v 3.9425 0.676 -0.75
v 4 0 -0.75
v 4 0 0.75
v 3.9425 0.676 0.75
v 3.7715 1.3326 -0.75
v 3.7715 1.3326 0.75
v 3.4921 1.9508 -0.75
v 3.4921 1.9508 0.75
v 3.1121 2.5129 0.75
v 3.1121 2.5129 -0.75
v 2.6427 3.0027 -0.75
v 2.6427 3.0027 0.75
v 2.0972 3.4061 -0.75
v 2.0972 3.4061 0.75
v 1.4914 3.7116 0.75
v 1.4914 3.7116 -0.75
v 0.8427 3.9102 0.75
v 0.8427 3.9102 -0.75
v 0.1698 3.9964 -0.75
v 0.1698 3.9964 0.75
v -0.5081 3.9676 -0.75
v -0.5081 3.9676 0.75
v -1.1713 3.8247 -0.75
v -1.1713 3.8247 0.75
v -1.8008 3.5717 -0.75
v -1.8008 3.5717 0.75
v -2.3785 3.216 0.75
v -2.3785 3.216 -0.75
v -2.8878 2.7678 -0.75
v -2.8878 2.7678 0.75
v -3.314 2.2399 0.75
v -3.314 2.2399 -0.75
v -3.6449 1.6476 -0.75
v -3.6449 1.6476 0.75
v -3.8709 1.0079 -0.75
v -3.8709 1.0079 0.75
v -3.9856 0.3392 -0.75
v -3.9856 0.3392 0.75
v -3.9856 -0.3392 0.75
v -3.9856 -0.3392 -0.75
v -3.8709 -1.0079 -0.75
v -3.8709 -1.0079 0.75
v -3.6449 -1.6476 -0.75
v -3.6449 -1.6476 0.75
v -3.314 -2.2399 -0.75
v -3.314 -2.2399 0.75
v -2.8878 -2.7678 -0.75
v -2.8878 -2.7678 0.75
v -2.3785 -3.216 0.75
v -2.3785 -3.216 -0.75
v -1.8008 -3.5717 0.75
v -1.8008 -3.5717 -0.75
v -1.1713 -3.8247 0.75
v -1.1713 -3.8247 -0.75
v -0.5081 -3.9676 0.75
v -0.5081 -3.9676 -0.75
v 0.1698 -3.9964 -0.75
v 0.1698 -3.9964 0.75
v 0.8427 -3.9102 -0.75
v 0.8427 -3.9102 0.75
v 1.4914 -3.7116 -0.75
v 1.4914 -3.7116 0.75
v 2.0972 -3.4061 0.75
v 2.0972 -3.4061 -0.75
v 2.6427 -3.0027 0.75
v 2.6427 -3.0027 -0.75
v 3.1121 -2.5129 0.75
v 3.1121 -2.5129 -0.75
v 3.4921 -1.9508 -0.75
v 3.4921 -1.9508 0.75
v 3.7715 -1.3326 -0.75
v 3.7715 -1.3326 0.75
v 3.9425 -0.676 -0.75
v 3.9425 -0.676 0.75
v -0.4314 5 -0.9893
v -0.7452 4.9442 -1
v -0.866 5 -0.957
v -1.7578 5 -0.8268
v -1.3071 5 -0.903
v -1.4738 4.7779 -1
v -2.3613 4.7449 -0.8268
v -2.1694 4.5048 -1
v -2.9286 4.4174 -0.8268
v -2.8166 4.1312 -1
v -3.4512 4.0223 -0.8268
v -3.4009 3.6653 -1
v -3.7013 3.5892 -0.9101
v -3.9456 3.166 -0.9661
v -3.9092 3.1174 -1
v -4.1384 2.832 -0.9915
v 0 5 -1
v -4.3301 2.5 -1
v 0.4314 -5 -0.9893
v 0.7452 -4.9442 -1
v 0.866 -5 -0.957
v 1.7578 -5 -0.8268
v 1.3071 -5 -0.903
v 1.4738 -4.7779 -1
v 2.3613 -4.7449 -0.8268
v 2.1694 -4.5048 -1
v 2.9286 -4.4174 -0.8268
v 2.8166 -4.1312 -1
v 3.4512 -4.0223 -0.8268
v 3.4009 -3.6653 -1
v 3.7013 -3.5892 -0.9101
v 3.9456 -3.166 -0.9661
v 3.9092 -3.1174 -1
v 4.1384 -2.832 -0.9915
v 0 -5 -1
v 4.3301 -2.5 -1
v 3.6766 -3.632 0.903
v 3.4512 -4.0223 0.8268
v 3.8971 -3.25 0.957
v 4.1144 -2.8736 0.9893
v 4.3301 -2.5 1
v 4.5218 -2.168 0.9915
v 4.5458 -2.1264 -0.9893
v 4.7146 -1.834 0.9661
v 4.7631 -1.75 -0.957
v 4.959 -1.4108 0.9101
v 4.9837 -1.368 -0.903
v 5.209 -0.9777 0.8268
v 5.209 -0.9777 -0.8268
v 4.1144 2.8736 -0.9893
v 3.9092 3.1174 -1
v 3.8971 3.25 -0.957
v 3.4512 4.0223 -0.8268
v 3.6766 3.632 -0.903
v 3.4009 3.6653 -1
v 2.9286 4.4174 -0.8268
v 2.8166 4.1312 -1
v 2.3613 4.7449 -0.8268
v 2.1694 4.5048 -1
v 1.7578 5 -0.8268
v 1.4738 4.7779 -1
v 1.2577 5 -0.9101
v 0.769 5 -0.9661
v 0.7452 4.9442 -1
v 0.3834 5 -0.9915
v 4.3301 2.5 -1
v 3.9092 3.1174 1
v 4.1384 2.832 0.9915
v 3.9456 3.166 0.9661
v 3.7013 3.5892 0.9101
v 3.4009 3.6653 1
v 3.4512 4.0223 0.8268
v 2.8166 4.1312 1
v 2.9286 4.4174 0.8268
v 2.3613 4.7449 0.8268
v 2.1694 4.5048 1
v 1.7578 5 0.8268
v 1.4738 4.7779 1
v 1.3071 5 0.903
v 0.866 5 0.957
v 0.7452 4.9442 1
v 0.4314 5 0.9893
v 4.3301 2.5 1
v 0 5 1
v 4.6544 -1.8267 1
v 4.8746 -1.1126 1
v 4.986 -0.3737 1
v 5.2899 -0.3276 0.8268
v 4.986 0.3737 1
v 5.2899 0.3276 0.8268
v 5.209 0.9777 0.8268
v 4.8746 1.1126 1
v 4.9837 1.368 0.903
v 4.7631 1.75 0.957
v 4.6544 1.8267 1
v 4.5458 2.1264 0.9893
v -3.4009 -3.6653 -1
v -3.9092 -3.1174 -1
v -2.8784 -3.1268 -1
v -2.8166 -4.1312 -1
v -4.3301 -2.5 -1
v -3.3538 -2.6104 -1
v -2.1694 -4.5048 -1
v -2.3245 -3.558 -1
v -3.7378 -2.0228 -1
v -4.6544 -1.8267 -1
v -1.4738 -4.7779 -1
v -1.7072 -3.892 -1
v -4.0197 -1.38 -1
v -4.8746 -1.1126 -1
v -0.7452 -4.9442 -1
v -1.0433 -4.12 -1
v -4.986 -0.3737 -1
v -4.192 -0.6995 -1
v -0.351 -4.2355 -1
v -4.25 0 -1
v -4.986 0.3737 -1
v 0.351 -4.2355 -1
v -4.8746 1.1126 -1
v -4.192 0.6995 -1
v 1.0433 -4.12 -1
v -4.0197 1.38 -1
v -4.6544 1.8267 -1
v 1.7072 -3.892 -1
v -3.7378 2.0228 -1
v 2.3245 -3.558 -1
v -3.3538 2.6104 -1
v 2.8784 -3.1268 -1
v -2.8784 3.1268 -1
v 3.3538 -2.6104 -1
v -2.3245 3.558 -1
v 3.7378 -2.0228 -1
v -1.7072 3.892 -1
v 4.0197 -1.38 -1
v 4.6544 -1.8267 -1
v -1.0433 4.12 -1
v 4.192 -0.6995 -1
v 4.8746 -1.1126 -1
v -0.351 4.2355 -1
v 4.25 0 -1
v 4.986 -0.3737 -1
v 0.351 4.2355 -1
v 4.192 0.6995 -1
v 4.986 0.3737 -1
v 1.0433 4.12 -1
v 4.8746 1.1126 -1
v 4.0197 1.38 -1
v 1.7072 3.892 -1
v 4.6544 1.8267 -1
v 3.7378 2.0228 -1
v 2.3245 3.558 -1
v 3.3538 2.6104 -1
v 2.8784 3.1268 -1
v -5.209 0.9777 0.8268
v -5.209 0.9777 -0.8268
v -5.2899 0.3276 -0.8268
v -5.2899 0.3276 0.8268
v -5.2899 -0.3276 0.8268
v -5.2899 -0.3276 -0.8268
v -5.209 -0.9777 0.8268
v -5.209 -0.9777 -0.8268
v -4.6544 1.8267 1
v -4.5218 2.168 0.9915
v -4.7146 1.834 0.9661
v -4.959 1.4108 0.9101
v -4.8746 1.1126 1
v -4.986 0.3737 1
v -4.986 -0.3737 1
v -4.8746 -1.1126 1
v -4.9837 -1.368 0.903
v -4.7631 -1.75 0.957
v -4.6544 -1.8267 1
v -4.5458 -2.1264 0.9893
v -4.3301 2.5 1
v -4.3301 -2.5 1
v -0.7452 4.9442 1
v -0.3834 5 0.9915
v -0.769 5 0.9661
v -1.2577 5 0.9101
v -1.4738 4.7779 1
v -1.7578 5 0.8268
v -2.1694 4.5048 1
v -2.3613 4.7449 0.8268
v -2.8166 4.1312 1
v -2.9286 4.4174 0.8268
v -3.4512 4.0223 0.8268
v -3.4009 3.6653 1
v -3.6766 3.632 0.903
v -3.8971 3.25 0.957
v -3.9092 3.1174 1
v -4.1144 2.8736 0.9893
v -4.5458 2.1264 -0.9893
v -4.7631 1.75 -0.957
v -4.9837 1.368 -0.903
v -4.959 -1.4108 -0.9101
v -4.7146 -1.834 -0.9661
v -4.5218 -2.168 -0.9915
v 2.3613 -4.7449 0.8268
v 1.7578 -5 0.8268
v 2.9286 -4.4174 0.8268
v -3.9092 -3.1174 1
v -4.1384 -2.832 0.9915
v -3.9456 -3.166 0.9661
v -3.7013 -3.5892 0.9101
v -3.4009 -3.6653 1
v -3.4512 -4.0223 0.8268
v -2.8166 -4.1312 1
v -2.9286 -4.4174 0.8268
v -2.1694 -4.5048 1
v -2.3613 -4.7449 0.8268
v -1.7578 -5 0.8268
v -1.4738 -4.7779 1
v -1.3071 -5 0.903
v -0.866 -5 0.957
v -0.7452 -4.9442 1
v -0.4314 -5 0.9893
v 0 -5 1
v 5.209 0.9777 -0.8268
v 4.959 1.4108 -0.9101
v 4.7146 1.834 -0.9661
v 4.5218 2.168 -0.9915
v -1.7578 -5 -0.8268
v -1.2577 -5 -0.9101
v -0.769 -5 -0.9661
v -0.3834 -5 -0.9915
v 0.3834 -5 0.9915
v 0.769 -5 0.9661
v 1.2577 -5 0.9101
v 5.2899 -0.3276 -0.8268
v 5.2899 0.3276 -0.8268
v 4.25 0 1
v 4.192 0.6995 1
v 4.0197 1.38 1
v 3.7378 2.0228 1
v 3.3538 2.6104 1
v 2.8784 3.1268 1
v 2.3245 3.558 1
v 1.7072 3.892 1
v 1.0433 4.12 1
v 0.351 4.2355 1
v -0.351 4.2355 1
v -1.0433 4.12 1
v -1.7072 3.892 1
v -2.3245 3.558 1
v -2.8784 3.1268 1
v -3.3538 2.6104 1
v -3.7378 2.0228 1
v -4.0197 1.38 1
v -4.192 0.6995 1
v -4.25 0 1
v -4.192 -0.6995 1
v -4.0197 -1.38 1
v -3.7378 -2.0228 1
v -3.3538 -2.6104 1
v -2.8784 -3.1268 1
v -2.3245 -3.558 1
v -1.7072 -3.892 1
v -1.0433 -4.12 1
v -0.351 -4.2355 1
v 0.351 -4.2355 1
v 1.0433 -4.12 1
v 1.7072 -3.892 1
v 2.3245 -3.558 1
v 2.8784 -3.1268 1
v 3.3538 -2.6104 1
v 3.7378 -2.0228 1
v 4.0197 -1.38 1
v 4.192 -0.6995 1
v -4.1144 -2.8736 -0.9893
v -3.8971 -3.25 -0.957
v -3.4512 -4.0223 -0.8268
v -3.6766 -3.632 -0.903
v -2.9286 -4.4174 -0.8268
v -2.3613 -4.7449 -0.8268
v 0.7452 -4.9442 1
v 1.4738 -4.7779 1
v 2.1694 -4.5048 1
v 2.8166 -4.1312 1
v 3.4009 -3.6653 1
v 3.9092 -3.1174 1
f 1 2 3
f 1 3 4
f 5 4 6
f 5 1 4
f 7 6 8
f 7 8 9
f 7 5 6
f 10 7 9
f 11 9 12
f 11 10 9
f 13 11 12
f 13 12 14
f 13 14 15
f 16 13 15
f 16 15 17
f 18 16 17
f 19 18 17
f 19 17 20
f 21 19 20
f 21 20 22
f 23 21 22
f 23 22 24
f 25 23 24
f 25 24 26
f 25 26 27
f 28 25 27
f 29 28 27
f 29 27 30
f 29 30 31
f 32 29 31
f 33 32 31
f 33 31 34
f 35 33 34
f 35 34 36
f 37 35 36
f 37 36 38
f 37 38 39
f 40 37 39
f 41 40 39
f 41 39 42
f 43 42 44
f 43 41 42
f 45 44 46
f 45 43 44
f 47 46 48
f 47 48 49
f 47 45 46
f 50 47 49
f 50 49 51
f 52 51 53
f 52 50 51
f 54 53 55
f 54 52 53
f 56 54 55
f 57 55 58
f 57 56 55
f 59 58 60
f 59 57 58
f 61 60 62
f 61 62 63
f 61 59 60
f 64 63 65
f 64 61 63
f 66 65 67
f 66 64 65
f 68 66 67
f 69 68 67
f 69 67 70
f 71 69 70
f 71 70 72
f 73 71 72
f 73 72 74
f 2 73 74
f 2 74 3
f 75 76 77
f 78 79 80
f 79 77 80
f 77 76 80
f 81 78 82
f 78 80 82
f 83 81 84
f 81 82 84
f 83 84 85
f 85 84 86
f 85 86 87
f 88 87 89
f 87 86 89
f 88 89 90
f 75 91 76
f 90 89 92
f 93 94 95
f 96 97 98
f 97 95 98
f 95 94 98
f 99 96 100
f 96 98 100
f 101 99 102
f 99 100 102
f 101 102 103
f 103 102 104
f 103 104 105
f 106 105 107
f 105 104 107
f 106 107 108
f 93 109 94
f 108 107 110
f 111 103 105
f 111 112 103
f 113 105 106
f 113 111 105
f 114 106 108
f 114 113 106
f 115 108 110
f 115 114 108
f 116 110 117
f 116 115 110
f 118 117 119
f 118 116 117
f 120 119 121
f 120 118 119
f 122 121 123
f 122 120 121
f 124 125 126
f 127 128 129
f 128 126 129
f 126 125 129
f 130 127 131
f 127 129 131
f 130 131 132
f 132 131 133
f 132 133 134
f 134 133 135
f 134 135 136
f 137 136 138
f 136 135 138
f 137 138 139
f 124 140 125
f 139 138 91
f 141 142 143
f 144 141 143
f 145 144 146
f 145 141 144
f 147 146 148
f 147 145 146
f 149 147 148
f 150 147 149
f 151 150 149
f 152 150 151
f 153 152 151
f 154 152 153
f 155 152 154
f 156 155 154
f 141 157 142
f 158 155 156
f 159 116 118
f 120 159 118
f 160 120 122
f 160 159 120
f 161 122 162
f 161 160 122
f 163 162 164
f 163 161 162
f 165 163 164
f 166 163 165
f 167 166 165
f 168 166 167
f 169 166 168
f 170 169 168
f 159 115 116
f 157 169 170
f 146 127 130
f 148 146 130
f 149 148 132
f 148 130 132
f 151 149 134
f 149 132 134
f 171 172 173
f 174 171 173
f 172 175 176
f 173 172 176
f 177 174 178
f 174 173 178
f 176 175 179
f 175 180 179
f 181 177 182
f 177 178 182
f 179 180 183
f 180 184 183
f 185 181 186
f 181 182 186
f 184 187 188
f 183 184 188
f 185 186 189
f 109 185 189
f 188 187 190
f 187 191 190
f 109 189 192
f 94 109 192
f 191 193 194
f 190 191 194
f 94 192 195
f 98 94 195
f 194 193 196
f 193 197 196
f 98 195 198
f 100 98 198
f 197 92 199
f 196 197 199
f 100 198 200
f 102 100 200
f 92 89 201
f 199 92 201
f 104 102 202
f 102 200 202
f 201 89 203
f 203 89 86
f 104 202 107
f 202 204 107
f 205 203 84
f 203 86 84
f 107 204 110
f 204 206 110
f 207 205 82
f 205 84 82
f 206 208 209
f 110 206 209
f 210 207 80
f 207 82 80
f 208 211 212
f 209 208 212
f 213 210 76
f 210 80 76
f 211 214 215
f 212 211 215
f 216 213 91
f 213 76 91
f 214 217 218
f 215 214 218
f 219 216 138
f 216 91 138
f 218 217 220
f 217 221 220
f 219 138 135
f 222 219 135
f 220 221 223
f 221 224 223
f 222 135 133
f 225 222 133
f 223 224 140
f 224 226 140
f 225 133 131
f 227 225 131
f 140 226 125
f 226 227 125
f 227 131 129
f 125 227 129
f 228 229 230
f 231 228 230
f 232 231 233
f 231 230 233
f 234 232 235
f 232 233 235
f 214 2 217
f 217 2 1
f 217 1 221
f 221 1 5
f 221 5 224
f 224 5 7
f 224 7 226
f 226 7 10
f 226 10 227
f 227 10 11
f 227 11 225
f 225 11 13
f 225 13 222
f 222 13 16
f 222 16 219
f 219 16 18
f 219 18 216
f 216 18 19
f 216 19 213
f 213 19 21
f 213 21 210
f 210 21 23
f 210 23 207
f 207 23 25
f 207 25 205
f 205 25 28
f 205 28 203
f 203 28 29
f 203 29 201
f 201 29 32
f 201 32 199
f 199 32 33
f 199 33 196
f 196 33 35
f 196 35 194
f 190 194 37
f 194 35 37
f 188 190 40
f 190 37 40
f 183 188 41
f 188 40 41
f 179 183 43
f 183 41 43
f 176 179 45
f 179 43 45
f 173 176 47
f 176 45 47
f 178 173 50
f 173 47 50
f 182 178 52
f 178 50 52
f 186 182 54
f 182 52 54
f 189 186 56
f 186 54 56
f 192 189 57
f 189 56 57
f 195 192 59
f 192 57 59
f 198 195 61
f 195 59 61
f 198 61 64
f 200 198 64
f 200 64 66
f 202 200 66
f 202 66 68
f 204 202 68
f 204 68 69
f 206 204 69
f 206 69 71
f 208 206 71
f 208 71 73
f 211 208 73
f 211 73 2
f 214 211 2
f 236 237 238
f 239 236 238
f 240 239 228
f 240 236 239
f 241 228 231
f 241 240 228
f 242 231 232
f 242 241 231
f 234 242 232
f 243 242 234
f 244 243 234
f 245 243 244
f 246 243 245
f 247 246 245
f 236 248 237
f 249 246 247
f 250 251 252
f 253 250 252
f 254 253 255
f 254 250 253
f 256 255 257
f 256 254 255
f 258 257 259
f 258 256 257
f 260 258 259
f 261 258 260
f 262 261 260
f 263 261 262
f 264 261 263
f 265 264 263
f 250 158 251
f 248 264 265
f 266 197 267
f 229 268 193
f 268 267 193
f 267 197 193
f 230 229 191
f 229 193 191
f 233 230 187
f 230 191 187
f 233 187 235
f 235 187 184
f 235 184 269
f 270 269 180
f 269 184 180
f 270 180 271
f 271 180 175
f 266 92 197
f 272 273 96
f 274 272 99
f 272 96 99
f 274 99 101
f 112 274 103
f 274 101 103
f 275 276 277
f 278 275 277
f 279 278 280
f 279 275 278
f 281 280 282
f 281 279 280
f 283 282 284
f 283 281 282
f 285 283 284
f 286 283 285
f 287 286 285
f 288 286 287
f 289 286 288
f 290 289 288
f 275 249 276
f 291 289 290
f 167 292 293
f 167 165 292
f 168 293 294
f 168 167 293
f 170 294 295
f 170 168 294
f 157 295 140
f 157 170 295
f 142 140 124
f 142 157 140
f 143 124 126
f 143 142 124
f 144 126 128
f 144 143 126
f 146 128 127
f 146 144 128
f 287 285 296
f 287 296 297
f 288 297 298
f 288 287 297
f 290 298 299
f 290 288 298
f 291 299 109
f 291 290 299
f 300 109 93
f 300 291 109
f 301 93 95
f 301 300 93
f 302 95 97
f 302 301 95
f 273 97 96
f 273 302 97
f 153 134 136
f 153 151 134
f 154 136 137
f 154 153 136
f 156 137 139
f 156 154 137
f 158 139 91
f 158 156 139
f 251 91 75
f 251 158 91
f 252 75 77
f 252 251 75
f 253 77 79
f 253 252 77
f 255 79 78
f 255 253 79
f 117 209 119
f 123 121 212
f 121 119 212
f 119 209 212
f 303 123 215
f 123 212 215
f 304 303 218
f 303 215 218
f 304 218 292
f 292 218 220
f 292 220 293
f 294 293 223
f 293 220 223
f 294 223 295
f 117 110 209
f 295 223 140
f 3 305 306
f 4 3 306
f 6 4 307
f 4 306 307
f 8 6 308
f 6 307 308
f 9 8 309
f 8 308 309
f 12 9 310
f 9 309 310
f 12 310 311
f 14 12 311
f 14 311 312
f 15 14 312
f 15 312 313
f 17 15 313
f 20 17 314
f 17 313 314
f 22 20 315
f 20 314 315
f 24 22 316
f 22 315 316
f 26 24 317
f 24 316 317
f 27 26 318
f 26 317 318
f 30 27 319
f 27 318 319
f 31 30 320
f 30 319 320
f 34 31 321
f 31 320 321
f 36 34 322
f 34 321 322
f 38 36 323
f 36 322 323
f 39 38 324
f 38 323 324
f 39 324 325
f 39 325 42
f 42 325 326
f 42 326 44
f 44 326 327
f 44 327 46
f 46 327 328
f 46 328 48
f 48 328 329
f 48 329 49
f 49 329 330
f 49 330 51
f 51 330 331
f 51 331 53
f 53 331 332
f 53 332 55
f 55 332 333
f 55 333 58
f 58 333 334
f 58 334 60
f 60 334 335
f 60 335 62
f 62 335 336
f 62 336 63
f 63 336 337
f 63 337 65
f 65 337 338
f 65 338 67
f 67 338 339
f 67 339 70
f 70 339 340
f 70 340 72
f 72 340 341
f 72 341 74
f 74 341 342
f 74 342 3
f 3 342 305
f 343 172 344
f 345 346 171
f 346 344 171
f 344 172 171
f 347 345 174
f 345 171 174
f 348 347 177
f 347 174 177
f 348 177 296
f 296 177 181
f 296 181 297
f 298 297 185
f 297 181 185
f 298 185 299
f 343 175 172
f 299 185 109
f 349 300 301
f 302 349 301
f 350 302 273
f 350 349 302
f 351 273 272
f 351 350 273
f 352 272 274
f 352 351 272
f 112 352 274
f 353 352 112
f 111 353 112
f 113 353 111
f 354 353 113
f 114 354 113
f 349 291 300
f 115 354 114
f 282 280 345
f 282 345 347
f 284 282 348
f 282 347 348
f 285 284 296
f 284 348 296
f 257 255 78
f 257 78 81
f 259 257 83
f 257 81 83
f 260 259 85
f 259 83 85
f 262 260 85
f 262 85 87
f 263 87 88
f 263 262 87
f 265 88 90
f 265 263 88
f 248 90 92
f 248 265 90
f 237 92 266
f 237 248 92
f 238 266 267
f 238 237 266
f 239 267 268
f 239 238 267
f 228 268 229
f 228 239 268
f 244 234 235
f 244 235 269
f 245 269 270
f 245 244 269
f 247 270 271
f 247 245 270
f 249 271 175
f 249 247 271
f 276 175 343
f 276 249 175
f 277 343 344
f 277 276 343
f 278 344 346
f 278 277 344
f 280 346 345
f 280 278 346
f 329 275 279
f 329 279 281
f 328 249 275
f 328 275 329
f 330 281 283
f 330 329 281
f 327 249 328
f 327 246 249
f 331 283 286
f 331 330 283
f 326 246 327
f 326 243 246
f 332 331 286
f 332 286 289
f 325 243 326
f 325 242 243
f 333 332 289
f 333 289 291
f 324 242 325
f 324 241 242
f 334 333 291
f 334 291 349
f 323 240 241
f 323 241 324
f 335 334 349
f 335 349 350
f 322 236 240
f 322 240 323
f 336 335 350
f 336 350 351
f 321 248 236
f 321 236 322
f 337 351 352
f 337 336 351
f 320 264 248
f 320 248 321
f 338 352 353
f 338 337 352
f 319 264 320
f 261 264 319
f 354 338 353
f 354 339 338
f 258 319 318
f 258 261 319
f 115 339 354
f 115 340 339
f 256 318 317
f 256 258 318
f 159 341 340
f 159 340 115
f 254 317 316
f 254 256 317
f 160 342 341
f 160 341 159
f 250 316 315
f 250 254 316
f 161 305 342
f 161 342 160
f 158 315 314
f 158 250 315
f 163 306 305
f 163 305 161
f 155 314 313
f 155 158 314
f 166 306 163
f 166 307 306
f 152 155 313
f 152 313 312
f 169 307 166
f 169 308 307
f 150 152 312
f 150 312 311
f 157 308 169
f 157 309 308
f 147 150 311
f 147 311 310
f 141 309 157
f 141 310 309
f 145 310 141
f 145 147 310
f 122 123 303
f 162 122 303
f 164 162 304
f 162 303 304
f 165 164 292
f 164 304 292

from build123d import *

# Parameters (mm, degrees)
HEX_SKETCH_R               = 4
HEX_2_DEPTH                = 1
HEX_CHAM_ID_SIZE           = 0.25
HEX_ROUND_DEPTH            = 8.702813339
HEX_ROUND_DEPTH_BACK       = 8.702813339
HEX_ROUND_SKETCH_OUTSIDE_W = 16.63
HEX_ROUND_SKETCH_OUTSIDE_H = 15.082
HEX_ROUND_SKETCH_OUTSIDE_R = 5.3


with BuildPart() as part:
    # Hex_Sketch → Hex 2 (new, symmetric)
    with BuildSketch(Plane.XY):
        Polygon((2.886751346, 5), (-2.886751346, 5), (-5.773502692, 0), (-2.886751346, -5), (2.886751346, -5), (5.773502692, 0), align=None)
        Circle(HEX_SKETCH_R, mode=Mode.SUBTRACT)
    extrude(amount=HEX_2_DEPTH, both=True)

    # Hex Cham OD_Sketch → Hex Cham OD (revolve, cut)
    with BuildSketch(Plane(origin=(0, 0, 0), x_dir=(1, 0, 0), z_dir=(0, 1, 0))):
        Polygon((-5.773502692, 1), (-5.773502692, 0.553418013), (-5, 1), align=None)
        Polygon((-5, -1), (-5.773502692, -1), (-5.773502692, -0.553418013), align=None)
    revolve(axis=Axis((0, 0, -5.304715554), (0, 0, 1)), mode=Mode.SUBTRACT)

    # Hex Cham ID
    hex_cham_id_edges = [part.edges().sort_by_distance(p)[0] for p in [
        (-4, 0, -1),
        (-4, 0, 1),
    ]]
    chamfer(hex_cham_id_edges, length=HEX_CHAM_ID_SIZE)

    # Hex Round_Sketch outside → Hex Round (cut, two sides: drawn at the far end of the back side and taken through both)
    with BuildSketch(Plane.XY.offset(-HEX_ROUND_DEPTH_BACK)):
        Rectangle(HEX_ROUND_SKETCH_OUTSIDE_W, HEX_ROUND_SKETCH_OUTSIDE_H)
        Circle(HEX_ROUND_SKETCH_OUTSIDE_R, mode=Mode.SUBTRACT)
    extrude(amount=HEX_ROUND_DEPTH + HEX_ROUND_DEPTH_BACK, mode=Mode.SUBTRACT)


solid = part.part
